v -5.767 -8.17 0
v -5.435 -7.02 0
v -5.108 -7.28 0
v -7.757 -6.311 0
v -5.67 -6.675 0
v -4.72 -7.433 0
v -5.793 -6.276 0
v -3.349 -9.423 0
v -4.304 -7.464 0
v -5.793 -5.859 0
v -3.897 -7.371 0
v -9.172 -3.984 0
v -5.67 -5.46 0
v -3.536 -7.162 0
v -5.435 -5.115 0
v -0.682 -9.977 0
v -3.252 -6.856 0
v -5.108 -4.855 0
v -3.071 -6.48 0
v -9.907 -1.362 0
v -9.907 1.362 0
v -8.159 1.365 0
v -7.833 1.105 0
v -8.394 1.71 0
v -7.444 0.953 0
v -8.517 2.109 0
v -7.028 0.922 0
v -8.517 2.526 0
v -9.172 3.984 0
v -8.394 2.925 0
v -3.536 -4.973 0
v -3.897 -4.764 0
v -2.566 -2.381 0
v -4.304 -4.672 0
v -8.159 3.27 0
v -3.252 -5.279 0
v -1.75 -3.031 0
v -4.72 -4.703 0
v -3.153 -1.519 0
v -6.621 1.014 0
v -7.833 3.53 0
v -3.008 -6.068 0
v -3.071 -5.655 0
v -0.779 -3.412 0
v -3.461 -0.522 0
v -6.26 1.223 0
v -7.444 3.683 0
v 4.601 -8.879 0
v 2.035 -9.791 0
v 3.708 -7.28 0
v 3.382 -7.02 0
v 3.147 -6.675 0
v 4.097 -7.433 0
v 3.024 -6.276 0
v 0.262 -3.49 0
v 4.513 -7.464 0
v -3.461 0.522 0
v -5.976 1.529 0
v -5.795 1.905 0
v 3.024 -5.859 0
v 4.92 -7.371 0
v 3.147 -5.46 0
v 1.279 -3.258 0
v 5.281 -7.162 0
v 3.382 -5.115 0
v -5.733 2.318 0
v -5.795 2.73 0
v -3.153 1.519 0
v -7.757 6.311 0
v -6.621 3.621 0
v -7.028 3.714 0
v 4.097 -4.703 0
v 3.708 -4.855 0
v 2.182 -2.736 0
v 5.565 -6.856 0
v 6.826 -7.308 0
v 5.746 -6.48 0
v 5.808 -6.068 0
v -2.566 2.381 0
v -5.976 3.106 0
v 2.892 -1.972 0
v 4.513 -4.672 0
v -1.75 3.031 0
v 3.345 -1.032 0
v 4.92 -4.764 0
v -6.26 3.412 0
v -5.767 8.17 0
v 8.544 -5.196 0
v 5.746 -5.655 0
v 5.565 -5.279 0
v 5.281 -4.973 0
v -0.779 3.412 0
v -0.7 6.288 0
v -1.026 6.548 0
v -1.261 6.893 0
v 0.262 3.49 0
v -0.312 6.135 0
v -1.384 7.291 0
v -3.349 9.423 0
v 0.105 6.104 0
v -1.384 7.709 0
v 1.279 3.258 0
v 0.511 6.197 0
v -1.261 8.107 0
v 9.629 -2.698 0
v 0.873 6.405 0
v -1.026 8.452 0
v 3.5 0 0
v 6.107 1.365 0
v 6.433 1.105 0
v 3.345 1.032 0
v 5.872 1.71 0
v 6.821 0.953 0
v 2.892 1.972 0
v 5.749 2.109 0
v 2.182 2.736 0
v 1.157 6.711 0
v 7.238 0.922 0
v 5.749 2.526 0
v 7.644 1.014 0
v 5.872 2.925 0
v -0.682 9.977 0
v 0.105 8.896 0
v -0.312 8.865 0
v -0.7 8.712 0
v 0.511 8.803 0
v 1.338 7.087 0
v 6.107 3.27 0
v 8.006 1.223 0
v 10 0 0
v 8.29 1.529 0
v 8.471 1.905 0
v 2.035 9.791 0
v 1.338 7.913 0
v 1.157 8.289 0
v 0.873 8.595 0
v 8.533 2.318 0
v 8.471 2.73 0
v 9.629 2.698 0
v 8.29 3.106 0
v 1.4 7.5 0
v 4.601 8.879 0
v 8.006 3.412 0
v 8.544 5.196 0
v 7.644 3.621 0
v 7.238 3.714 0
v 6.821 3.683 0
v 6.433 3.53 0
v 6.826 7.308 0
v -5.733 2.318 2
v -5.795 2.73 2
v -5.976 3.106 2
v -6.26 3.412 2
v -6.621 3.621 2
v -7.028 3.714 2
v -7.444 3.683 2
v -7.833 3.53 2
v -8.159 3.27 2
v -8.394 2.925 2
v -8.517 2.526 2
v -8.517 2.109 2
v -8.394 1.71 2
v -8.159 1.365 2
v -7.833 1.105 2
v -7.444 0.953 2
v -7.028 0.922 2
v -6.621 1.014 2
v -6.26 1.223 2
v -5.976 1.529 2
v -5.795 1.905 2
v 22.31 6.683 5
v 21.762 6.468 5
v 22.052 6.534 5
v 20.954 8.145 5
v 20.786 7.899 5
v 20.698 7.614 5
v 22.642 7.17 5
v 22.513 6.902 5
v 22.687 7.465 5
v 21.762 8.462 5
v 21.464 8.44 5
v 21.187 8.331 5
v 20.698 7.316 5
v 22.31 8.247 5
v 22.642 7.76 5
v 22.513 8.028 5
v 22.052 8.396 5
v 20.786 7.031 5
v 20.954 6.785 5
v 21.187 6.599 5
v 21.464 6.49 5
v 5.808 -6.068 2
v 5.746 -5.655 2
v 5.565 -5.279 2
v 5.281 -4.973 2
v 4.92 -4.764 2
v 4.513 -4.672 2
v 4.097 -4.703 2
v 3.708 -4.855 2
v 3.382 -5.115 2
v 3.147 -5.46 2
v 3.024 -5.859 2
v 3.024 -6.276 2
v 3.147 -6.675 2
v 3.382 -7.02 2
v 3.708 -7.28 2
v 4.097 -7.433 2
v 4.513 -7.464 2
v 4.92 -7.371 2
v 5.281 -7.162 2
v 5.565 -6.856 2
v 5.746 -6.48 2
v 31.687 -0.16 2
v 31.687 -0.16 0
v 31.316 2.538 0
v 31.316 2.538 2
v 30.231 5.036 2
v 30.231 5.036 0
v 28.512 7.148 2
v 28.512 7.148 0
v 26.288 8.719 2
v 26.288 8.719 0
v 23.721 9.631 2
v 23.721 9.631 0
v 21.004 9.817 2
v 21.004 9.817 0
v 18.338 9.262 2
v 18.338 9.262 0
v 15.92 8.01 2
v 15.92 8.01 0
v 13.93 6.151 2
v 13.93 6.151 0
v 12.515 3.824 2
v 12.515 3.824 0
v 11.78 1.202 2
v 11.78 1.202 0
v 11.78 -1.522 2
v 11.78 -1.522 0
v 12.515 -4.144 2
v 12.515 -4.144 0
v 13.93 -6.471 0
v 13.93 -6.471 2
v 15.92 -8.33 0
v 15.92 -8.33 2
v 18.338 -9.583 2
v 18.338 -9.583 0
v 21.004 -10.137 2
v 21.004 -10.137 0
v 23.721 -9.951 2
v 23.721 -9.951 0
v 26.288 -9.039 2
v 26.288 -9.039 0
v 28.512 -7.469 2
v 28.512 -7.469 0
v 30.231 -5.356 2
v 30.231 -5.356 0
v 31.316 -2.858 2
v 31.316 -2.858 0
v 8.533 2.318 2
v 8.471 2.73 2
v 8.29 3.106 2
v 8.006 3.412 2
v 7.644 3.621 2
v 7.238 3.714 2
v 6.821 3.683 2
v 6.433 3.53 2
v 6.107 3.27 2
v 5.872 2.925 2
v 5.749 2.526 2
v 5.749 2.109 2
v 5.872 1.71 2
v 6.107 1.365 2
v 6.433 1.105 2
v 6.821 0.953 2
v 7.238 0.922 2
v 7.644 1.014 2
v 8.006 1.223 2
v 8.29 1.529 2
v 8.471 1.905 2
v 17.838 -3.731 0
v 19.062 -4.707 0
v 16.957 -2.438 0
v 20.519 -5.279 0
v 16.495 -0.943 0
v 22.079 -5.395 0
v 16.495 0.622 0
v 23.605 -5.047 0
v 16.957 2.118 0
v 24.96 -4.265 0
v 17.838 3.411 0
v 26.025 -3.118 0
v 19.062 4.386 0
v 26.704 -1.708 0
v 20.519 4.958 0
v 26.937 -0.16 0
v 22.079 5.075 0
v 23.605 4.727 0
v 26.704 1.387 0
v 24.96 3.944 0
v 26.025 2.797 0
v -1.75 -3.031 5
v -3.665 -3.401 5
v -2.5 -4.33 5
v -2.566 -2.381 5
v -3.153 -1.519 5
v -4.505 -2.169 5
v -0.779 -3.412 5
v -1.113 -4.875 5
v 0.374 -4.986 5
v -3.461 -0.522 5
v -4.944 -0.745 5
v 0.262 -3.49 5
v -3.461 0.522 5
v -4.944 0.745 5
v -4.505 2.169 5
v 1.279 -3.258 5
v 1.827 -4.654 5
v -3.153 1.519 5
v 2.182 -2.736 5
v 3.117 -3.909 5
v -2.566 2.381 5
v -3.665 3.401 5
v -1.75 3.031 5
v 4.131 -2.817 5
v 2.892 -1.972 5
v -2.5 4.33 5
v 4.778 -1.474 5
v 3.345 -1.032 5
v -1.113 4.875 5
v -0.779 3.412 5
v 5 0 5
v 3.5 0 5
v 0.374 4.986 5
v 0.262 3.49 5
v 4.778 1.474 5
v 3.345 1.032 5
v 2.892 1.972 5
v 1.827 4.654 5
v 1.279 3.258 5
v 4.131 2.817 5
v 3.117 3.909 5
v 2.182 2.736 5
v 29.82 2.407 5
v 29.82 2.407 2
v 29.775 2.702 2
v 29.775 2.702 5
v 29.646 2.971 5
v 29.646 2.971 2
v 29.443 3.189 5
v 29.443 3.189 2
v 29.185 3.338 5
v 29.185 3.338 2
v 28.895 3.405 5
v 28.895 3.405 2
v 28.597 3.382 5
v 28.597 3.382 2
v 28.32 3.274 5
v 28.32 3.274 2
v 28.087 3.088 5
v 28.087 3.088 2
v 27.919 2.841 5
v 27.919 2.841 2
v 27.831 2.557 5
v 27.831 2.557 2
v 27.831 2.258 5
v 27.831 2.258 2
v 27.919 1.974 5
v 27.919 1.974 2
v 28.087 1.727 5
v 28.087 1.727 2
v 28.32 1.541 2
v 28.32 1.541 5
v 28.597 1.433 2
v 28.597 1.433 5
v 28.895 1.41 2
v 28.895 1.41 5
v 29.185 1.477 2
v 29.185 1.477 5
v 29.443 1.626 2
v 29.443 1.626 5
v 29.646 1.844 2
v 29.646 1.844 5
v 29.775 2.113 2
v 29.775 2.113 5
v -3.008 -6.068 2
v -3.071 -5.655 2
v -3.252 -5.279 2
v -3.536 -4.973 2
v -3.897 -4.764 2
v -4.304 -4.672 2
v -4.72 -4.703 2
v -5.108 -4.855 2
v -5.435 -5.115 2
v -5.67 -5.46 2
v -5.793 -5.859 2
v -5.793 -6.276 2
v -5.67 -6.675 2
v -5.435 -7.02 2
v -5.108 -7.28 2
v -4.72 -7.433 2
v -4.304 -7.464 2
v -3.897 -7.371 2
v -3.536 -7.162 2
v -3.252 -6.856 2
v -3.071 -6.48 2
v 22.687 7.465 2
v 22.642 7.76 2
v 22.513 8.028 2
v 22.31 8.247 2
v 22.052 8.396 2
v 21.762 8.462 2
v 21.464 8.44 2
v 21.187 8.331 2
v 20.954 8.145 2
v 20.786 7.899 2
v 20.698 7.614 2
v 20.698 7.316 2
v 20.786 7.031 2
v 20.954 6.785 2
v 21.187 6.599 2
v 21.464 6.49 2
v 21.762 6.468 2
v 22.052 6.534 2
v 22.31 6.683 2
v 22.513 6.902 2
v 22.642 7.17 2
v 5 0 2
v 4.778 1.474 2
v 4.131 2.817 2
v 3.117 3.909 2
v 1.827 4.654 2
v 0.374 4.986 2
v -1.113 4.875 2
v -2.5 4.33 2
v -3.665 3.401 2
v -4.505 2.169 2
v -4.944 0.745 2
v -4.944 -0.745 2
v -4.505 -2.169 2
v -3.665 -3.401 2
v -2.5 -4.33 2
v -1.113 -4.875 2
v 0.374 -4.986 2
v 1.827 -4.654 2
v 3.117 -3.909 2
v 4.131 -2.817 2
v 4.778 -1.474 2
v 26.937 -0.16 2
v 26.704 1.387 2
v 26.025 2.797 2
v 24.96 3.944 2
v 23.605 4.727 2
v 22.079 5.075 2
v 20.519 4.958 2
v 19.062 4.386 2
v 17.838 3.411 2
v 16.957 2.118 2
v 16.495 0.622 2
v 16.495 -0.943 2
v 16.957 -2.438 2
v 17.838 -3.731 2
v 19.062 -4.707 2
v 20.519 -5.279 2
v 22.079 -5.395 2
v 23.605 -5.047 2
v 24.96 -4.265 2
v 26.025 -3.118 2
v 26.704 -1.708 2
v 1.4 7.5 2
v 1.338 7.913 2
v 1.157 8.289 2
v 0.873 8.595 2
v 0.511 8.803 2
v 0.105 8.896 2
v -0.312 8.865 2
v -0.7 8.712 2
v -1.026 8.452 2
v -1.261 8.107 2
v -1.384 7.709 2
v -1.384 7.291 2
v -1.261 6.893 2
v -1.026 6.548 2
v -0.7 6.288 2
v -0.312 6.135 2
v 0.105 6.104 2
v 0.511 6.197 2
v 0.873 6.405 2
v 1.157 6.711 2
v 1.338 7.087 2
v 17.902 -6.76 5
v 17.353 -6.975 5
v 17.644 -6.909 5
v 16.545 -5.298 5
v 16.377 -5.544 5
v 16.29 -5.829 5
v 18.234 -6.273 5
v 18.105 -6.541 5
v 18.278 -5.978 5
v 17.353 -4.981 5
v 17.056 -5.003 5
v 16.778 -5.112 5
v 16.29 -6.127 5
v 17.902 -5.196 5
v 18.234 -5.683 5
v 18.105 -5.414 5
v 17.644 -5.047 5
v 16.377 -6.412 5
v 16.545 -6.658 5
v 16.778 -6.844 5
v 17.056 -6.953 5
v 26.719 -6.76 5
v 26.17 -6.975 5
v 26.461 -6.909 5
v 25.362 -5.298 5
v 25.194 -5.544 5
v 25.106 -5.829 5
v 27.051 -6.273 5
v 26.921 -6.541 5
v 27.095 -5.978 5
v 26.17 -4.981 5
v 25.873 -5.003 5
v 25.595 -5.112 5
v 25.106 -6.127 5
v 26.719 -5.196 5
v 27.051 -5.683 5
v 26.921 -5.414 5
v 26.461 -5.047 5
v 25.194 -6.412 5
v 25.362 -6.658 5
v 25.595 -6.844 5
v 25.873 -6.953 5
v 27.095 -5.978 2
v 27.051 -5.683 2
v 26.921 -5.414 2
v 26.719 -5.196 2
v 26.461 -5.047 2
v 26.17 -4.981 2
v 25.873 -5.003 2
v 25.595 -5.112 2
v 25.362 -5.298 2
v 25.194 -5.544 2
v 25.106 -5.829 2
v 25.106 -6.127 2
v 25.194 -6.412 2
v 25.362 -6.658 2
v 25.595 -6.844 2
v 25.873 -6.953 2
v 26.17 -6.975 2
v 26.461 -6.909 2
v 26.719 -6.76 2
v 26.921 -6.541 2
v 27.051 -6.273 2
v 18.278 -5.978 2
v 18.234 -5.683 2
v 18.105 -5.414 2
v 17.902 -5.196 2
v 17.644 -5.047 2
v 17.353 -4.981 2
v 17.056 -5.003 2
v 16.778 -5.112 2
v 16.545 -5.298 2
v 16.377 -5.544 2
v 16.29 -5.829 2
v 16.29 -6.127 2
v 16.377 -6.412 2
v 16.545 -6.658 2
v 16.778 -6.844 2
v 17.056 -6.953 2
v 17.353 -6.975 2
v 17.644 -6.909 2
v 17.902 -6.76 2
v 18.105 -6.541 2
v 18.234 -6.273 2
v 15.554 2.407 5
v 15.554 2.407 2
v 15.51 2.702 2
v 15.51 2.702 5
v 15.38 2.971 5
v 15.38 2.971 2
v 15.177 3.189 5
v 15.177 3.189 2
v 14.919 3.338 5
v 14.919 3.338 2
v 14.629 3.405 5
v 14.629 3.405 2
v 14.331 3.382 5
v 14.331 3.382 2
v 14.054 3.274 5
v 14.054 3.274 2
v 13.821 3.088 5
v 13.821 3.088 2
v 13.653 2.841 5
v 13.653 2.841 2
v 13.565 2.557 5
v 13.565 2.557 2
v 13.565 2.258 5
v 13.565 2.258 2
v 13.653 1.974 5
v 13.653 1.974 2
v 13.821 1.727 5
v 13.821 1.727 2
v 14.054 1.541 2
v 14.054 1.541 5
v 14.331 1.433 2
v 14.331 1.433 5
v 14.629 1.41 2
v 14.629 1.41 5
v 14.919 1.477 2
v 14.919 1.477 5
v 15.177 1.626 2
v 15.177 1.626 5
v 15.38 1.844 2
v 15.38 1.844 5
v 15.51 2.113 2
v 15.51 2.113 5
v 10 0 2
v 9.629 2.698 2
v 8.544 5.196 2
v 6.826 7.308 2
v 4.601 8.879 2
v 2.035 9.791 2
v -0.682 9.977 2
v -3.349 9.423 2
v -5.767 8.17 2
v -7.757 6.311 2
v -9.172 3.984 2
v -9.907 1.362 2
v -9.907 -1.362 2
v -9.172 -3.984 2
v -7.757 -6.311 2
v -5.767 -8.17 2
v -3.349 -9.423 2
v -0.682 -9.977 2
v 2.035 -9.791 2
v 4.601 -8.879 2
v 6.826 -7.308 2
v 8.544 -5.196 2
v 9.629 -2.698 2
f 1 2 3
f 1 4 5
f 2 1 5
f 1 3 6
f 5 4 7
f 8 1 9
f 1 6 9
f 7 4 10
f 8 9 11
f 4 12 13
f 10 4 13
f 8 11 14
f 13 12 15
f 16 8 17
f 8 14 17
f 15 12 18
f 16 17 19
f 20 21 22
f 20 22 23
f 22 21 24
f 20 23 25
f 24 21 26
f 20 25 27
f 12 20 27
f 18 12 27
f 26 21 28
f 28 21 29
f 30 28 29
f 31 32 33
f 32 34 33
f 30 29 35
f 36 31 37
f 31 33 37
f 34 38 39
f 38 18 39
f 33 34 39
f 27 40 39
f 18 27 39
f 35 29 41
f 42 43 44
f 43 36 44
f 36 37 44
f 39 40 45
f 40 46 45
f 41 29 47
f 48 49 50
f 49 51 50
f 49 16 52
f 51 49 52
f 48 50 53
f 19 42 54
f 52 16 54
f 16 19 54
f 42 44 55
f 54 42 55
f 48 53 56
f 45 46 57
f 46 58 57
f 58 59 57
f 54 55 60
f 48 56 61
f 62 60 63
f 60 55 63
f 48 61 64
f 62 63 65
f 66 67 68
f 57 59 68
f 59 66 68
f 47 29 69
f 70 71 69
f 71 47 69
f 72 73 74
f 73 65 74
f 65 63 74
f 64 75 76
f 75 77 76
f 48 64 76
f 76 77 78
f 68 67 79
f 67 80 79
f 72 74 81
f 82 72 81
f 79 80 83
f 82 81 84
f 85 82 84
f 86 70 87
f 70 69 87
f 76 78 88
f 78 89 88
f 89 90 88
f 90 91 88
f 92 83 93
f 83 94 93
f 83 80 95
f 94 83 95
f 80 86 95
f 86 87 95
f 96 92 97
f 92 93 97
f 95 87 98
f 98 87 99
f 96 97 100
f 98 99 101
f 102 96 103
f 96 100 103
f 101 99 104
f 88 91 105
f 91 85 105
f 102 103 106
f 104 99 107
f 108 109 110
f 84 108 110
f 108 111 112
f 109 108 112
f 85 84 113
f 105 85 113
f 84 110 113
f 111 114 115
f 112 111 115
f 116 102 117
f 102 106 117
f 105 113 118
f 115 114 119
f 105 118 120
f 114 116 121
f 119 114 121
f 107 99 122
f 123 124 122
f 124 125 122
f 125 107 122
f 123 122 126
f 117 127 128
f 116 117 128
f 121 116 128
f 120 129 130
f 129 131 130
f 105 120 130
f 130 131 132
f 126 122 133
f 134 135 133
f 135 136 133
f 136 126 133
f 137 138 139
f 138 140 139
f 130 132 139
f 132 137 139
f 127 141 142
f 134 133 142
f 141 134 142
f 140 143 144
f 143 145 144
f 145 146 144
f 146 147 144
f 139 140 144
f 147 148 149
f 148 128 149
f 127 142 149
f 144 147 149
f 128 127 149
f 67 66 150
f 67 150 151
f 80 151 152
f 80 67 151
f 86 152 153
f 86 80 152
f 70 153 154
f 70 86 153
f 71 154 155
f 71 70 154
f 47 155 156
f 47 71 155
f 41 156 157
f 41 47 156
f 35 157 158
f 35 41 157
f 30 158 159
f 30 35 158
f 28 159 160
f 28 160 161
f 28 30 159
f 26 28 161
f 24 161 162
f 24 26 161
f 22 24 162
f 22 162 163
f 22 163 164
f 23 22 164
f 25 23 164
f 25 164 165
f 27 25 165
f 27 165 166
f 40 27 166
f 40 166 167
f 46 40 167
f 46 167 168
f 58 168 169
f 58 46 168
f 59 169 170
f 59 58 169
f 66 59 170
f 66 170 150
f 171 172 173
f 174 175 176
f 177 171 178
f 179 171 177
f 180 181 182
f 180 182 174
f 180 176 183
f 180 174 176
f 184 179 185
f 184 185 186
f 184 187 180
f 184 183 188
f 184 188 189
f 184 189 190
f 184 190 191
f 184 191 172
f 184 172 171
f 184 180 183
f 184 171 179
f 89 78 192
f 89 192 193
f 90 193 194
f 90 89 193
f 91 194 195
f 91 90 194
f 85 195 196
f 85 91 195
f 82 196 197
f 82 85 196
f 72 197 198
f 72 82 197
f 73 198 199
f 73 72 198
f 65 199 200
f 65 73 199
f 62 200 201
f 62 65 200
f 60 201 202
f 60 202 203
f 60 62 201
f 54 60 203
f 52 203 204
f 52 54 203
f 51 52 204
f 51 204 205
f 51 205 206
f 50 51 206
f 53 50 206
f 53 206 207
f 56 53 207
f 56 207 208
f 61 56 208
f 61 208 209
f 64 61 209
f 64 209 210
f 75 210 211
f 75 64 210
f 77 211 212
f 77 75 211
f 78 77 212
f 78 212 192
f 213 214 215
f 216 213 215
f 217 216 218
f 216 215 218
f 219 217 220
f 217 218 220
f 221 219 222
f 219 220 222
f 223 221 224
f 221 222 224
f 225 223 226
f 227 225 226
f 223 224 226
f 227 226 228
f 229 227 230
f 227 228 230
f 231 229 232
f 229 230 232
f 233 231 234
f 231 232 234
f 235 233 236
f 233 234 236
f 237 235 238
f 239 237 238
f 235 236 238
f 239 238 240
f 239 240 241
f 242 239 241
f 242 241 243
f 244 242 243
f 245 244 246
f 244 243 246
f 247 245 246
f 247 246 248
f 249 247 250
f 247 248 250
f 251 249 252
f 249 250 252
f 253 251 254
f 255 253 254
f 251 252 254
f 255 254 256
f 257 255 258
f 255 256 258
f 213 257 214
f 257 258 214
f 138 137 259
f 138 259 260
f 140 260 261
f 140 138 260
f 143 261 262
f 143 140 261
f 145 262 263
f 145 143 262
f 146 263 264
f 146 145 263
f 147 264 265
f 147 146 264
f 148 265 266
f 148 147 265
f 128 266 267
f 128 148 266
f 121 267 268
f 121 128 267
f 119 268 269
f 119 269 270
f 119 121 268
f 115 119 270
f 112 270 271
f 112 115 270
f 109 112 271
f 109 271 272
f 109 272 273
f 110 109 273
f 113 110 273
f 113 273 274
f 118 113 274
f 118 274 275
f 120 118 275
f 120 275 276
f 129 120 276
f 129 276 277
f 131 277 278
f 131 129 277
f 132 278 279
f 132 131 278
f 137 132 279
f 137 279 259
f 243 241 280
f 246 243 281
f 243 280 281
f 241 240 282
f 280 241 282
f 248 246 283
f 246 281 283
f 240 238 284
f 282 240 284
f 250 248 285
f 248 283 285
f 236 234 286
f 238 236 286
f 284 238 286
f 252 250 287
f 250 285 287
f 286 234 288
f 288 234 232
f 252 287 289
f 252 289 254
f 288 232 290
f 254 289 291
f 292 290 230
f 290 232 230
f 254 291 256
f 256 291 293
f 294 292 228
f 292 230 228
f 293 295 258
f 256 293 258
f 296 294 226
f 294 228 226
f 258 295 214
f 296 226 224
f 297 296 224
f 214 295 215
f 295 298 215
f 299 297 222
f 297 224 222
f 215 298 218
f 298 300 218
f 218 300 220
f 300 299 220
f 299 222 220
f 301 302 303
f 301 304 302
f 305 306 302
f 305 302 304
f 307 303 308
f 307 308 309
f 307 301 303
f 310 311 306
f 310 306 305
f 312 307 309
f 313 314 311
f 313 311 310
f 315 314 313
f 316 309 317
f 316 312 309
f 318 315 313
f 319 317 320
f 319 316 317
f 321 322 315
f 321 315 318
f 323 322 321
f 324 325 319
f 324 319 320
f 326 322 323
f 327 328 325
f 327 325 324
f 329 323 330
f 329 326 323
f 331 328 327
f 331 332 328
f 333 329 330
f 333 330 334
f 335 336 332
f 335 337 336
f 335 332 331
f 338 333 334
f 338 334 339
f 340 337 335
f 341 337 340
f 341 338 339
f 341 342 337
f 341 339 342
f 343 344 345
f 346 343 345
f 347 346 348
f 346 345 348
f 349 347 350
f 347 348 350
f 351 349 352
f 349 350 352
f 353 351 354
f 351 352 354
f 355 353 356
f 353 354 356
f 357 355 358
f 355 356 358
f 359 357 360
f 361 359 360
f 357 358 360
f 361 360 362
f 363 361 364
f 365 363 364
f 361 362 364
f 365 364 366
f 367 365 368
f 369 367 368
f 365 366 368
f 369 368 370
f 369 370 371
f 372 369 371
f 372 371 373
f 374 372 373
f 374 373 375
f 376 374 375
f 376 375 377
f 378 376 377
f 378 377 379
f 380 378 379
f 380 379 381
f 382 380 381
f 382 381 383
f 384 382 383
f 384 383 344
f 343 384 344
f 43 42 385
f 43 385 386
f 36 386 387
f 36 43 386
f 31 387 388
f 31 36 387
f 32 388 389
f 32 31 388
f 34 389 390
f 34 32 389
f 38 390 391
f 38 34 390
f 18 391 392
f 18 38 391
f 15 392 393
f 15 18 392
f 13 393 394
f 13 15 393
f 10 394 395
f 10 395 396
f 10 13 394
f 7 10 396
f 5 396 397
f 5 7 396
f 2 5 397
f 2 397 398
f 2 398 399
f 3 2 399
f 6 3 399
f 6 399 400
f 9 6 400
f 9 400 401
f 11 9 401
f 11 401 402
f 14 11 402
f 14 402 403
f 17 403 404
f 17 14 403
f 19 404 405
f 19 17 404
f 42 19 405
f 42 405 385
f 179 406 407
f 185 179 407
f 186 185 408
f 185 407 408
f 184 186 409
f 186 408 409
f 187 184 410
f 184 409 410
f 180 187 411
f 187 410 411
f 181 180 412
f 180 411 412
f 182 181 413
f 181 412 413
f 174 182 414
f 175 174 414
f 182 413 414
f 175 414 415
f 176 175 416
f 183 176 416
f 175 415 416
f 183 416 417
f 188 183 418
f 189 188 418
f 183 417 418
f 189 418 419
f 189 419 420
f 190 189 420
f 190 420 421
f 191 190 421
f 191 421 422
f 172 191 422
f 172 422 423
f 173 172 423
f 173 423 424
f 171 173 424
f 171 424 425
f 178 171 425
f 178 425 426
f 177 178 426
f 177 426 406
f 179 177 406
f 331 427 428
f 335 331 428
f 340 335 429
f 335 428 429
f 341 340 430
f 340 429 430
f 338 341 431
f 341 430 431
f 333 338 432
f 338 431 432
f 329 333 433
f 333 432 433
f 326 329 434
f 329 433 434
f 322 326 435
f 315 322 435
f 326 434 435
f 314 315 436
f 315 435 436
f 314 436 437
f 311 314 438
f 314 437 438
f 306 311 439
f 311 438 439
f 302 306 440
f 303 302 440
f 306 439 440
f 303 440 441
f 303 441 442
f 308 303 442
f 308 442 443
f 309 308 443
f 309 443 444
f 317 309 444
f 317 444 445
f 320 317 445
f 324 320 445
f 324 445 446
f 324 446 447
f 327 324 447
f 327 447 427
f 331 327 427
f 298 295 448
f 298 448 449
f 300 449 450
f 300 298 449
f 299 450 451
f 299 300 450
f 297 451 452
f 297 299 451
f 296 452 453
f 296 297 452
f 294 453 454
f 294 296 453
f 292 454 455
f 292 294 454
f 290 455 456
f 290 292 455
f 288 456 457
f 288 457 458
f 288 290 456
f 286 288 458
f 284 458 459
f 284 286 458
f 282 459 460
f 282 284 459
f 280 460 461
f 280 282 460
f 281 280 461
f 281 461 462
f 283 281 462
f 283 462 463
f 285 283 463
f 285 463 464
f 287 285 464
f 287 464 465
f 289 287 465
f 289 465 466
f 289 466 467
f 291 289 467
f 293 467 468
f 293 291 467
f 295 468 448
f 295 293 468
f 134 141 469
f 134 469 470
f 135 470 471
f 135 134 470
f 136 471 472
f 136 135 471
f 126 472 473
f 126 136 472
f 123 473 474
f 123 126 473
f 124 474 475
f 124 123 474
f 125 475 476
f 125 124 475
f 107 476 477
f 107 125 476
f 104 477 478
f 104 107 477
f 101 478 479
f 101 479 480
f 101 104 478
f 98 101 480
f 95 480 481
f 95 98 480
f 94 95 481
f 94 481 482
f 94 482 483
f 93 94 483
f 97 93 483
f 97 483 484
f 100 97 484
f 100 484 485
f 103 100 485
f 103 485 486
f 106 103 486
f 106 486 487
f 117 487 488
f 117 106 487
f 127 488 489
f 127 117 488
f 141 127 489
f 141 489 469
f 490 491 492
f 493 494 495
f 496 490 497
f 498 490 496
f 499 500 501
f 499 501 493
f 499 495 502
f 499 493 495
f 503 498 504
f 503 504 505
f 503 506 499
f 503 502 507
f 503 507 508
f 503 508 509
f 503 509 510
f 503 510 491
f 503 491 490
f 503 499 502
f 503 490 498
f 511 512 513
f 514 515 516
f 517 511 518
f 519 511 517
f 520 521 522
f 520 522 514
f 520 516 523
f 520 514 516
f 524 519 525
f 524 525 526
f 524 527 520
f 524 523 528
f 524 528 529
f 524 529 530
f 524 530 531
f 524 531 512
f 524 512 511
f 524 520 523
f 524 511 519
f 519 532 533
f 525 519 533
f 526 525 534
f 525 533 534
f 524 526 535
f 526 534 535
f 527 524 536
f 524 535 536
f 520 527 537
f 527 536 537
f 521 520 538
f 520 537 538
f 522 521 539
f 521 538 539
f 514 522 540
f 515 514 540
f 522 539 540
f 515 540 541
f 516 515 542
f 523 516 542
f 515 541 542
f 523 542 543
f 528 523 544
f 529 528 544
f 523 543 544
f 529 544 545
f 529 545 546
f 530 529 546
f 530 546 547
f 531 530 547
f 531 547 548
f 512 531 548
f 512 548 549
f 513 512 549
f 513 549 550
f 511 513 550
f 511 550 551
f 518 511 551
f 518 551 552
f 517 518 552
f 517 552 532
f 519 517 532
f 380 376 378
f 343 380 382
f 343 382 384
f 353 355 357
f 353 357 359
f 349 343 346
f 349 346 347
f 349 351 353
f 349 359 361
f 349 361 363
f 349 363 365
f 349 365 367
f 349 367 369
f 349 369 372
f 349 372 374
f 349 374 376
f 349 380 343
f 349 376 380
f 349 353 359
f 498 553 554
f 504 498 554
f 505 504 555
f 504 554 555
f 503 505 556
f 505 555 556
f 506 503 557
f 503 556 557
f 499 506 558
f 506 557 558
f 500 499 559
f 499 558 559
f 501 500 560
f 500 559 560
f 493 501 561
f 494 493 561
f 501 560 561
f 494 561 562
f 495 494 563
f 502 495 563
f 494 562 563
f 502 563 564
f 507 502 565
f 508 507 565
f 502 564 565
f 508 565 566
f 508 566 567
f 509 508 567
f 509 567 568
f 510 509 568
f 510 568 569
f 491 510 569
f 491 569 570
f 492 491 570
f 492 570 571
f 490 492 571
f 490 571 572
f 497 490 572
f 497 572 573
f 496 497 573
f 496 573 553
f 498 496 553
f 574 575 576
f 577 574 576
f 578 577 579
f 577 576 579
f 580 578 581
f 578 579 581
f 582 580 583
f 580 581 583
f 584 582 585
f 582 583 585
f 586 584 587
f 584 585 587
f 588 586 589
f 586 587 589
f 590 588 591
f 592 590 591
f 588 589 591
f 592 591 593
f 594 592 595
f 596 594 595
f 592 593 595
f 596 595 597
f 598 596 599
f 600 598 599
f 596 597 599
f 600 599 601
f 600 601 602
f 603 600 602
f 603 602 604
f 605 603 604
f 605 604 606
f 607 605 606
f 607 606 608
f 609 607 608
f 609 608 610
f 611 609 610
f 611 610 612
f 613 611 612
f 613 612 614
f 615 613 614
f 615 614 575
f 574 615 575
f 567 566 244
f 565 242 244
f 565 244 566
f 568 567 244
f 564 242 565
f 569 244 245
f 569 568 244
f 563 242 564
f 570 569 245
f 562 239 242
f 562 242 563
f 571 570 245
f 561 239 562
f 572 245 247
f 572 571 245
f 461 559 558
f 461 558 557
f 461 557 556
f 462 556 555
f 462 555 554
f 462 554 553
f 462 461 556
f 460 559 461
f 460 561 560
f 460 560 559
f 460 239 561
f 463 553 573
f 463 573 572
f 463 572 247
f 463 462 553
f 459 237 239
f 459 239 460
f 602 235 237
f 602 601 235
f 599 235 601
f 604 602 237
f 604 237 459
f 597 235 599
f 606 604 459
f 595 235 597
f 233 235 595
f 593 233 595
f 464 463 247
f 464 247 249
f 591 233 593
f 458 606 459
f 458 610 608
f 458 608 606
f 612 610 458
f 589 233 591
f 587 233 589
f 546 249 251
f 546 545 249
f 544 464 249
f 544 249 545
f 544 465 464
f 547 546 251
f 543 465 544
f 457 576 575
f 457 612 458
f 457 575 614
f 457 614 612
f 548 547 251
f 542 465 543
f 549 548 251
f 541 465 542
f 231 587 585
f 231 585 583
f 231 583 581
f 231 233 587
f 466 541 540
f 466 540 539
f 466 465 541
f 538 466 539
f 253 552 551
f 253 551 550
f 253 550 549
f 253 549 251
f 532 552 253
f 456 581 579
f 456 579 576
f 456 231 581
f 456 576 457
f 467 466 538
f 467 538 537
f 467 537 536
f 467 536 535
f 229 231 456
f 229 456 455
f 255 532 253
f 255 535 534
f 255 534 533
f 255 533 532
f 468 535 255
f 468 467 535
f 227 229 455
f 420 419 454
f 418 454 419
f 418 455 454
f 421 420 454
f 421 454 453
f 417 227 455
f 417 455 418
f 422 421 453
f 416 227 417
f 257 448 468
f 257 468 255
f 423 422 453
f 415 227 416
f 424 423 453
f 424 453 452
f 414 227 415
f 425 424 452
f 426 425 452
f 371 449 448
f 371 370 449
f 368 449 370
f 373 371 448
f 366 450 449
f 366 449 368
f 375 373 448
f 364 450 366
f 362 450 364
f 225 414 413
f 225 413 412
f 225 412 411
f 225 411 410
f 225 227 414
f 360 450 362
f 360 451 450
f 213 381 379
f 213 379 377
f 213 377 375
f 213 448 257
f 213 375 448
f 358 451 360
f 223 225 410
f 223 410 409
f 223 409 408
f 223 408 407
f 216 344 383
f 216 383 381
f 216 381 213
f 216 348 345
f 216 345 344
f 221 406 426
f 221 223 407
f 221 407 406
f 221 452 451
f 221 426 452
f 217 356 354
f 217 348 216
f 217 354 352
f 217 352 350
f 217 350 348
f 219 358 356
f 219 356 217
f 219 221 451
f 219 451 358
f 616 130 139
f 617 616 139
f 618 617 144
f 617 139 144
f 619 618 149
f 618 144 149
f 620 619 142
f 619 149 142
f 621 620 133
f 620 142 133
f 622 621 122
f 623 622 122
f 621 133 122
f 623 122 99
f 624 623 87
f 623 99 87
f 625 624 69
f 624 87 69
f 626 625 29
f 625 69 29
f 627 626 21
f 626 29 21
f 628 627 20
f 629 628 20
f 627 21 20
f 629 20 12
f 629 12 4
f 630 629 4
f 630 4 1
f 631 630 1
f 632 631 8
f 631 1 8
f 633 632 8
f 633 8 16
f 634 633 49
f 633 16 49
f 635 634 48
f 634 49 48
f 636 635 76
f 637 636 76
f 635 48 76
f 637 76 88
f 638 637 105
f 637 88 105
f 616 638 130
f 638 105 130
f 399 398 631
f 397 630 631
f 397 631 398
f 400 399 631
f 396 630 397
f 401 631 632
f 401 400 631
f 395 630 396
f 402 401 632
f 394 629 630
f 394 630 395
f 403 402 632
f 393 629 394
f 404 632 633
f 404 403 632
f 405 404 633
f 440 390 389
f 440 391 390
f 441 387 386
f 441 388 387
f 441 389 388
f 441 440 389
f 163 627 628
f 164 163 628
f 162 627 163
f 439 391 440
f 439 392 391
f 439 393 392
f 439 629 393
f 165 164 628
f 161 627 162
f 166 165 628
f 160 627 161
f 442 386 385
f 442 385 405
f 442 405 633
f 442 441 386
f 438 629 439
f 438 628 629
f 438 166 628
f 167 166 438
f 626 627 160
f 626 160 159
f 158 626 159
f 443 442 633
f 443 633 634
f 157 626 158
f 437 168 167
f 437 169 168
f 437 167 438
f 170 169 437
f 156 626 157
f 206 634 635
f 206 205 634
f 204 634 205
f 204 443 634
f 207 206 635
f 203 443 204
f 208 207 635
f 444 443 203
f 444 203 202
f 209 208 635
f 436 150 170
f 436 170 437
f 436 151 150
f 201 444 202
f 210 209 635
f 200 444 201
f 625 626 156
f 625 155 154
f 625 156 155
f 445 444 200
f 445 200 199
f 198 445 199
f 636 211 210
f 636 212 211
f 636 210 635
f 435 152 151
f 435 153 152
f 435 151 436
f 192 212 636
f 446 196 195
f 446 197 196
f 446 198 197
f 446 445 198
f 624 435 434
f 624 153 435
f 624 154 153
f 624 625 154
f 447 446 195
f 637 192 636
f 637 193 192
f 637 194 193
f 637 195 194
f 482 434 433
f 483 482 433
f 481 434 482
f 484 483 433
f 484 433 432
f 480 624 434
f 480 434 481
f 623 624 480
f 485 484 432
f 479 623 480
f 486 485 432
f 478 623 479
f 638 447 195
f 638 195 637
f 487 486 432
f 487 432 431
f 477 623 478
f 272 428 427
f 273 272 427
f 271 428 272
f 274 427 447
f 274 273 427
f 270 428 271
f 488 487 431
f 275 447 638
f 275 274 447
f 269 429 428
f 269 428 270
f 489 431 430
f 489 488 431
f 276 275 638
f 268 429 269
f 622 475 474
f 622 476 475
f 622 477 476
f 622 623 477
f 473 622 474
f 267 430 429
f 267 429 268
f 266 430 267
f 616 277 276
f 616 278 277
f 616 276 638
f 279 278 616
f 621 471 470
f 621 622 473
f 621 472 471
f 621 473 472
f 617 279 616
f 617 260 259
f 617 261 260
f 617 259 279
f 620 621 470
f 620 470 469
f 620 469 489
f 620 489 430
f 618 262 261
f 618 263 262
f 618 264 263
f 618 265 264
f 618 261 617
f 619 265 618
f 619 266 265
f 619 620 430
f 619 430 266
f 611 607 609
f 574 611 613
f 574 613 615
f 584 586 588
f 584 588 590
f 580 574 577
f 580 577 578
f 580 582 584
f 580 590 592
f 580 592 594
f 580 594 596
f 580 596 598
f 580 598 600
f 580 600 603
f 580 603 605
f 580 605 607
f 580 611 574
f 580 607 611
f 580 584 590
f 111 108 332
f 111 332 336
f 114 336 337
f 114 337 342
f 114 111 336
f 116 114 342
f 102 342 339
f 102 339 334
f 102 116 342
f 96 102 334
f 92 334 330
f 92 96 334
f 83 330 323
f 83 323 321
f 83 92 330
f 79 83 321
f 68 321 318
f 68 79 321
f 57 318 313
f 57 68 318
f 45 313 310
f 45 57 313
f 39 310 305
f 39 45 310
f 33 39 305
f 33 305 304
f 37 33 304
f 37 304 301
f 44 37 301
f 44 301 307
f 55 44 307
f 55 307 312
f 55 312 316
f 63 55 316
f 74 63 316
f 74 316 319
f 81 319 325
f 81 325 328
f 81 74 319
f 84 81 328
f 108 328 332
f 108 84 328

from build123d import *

# Parameters (mm, degrees)
F0_R     = 10
F0_R_2   = 1.4
F0_R_3   = 5
F1_DEPTH = 2
F3_R     = 5
F3_R_2   = 3.5
F4_DEPTH = 5
F2_R     = 10
F2_R_2   = 1
F2_R_3   = 5.25
F5_DEPTH = 2
F6_DEPTH = 5


with BuildPart() as f1:
    # F0 (on Top) → F1 (new body)
    with BuildSketch(Plane.XY):
        Circle(F0_R)
        with Locations((-4.408389, -6.067627)):
            Circle(F0_R_2, mode=Mode.SUBTRACT)
        with Locations((4.408389, -6.067627)):
            Circle(F0_R_2, mode=Mode.SUBTRACT)
        with Locations((-7.132924, 2.317627)):
            Circle(F0_R_2, mode=Mode.SUBTRACT)
        Circle(F0_R_3, mode=Mode.SUBTRACT)
        with Locations((7.132924, 2.317627)):
            Circle(F0_R_2, mode=Mode.SUBTRACT)
        with Locations((0, 7.5)):
            Circle(F0_R_2, mode=Mode.SUBTRACT)
    extrude(amount=F1_DEPTH)

    # F3 (on Top) → F4 (join)
    with BuildSketch(Plane.XY):
        Circle(F3_R)
        Circle(F3_R_2, mode=Mode.SUBTRACT)
    extrude(amount=F4_DEPTH)


with BuildPart() as f5:
    # F2 (on Top) → F5 (new body)
    with BuildSketch(Plane.XY):
        with Locations((21.686854, -0.160141)):
            Circle(F2_R)
        with Locations((17.278464, -5.977768)):
            Circle(F2_R_2, mode=Mode.SUBTRACT)
        with Locations((26.095243, -5.977768)):
            Circle(F2_R_2, mode=Mode.SUBTRACT)
        with Locations((14.55393, 2.407487)):
            Circle(F2_R_2, mode=Mode.SUBTRACT)
        with Locations((21.686854, -0.160141)):
            Circle(F2_R_3, mode=Mode.SUBTRACT)
        with Locations((28.819778, 2.407487)):
            Circle(F2_R_2, mode=Mode.SUBTRACT)
        with Locations((21.686854, 7.464859)):
            Circle(F2_R_2, mode=Mode.SUBTRACT)
        with Locations((14.55393, 2.407487)):
            Circle(F2_R_2)
        with Locations((21.686854, 7.464859)):
            Circle(F2_R_2)
        with Locations((28.819778, 2.407487)):
            Circle(F2_R_2)
        with Locations((26.095243, -5.977768)):
            Circle(F2_R_2)
        with Locations((17.278464, -5.977768)):
            Circle(F2_R_2)
    extrude(amount=F5_DEPTH)

    # F2 (on Top) → F6 (join)
    with BuildSketch(Plane.XY):
        with Locations((21.686854, 7.464859)):
            Circle(F2_R_2)
        with Locations((28.819778, 2.407487)):
            Circle(F2_R_2)
        with Locations((26.095243, -5.977768)):
            Circle(F2_R_2)
        with Locations((17.278464, -5.977768)):
            Circle(F2_R_2)
        with Locations((14.55393, 2.407487)):
            Circle(F2_R_2)
    extrude(amount=F6_DEPTH)


solid = Compound([f1.part, f5.part])
